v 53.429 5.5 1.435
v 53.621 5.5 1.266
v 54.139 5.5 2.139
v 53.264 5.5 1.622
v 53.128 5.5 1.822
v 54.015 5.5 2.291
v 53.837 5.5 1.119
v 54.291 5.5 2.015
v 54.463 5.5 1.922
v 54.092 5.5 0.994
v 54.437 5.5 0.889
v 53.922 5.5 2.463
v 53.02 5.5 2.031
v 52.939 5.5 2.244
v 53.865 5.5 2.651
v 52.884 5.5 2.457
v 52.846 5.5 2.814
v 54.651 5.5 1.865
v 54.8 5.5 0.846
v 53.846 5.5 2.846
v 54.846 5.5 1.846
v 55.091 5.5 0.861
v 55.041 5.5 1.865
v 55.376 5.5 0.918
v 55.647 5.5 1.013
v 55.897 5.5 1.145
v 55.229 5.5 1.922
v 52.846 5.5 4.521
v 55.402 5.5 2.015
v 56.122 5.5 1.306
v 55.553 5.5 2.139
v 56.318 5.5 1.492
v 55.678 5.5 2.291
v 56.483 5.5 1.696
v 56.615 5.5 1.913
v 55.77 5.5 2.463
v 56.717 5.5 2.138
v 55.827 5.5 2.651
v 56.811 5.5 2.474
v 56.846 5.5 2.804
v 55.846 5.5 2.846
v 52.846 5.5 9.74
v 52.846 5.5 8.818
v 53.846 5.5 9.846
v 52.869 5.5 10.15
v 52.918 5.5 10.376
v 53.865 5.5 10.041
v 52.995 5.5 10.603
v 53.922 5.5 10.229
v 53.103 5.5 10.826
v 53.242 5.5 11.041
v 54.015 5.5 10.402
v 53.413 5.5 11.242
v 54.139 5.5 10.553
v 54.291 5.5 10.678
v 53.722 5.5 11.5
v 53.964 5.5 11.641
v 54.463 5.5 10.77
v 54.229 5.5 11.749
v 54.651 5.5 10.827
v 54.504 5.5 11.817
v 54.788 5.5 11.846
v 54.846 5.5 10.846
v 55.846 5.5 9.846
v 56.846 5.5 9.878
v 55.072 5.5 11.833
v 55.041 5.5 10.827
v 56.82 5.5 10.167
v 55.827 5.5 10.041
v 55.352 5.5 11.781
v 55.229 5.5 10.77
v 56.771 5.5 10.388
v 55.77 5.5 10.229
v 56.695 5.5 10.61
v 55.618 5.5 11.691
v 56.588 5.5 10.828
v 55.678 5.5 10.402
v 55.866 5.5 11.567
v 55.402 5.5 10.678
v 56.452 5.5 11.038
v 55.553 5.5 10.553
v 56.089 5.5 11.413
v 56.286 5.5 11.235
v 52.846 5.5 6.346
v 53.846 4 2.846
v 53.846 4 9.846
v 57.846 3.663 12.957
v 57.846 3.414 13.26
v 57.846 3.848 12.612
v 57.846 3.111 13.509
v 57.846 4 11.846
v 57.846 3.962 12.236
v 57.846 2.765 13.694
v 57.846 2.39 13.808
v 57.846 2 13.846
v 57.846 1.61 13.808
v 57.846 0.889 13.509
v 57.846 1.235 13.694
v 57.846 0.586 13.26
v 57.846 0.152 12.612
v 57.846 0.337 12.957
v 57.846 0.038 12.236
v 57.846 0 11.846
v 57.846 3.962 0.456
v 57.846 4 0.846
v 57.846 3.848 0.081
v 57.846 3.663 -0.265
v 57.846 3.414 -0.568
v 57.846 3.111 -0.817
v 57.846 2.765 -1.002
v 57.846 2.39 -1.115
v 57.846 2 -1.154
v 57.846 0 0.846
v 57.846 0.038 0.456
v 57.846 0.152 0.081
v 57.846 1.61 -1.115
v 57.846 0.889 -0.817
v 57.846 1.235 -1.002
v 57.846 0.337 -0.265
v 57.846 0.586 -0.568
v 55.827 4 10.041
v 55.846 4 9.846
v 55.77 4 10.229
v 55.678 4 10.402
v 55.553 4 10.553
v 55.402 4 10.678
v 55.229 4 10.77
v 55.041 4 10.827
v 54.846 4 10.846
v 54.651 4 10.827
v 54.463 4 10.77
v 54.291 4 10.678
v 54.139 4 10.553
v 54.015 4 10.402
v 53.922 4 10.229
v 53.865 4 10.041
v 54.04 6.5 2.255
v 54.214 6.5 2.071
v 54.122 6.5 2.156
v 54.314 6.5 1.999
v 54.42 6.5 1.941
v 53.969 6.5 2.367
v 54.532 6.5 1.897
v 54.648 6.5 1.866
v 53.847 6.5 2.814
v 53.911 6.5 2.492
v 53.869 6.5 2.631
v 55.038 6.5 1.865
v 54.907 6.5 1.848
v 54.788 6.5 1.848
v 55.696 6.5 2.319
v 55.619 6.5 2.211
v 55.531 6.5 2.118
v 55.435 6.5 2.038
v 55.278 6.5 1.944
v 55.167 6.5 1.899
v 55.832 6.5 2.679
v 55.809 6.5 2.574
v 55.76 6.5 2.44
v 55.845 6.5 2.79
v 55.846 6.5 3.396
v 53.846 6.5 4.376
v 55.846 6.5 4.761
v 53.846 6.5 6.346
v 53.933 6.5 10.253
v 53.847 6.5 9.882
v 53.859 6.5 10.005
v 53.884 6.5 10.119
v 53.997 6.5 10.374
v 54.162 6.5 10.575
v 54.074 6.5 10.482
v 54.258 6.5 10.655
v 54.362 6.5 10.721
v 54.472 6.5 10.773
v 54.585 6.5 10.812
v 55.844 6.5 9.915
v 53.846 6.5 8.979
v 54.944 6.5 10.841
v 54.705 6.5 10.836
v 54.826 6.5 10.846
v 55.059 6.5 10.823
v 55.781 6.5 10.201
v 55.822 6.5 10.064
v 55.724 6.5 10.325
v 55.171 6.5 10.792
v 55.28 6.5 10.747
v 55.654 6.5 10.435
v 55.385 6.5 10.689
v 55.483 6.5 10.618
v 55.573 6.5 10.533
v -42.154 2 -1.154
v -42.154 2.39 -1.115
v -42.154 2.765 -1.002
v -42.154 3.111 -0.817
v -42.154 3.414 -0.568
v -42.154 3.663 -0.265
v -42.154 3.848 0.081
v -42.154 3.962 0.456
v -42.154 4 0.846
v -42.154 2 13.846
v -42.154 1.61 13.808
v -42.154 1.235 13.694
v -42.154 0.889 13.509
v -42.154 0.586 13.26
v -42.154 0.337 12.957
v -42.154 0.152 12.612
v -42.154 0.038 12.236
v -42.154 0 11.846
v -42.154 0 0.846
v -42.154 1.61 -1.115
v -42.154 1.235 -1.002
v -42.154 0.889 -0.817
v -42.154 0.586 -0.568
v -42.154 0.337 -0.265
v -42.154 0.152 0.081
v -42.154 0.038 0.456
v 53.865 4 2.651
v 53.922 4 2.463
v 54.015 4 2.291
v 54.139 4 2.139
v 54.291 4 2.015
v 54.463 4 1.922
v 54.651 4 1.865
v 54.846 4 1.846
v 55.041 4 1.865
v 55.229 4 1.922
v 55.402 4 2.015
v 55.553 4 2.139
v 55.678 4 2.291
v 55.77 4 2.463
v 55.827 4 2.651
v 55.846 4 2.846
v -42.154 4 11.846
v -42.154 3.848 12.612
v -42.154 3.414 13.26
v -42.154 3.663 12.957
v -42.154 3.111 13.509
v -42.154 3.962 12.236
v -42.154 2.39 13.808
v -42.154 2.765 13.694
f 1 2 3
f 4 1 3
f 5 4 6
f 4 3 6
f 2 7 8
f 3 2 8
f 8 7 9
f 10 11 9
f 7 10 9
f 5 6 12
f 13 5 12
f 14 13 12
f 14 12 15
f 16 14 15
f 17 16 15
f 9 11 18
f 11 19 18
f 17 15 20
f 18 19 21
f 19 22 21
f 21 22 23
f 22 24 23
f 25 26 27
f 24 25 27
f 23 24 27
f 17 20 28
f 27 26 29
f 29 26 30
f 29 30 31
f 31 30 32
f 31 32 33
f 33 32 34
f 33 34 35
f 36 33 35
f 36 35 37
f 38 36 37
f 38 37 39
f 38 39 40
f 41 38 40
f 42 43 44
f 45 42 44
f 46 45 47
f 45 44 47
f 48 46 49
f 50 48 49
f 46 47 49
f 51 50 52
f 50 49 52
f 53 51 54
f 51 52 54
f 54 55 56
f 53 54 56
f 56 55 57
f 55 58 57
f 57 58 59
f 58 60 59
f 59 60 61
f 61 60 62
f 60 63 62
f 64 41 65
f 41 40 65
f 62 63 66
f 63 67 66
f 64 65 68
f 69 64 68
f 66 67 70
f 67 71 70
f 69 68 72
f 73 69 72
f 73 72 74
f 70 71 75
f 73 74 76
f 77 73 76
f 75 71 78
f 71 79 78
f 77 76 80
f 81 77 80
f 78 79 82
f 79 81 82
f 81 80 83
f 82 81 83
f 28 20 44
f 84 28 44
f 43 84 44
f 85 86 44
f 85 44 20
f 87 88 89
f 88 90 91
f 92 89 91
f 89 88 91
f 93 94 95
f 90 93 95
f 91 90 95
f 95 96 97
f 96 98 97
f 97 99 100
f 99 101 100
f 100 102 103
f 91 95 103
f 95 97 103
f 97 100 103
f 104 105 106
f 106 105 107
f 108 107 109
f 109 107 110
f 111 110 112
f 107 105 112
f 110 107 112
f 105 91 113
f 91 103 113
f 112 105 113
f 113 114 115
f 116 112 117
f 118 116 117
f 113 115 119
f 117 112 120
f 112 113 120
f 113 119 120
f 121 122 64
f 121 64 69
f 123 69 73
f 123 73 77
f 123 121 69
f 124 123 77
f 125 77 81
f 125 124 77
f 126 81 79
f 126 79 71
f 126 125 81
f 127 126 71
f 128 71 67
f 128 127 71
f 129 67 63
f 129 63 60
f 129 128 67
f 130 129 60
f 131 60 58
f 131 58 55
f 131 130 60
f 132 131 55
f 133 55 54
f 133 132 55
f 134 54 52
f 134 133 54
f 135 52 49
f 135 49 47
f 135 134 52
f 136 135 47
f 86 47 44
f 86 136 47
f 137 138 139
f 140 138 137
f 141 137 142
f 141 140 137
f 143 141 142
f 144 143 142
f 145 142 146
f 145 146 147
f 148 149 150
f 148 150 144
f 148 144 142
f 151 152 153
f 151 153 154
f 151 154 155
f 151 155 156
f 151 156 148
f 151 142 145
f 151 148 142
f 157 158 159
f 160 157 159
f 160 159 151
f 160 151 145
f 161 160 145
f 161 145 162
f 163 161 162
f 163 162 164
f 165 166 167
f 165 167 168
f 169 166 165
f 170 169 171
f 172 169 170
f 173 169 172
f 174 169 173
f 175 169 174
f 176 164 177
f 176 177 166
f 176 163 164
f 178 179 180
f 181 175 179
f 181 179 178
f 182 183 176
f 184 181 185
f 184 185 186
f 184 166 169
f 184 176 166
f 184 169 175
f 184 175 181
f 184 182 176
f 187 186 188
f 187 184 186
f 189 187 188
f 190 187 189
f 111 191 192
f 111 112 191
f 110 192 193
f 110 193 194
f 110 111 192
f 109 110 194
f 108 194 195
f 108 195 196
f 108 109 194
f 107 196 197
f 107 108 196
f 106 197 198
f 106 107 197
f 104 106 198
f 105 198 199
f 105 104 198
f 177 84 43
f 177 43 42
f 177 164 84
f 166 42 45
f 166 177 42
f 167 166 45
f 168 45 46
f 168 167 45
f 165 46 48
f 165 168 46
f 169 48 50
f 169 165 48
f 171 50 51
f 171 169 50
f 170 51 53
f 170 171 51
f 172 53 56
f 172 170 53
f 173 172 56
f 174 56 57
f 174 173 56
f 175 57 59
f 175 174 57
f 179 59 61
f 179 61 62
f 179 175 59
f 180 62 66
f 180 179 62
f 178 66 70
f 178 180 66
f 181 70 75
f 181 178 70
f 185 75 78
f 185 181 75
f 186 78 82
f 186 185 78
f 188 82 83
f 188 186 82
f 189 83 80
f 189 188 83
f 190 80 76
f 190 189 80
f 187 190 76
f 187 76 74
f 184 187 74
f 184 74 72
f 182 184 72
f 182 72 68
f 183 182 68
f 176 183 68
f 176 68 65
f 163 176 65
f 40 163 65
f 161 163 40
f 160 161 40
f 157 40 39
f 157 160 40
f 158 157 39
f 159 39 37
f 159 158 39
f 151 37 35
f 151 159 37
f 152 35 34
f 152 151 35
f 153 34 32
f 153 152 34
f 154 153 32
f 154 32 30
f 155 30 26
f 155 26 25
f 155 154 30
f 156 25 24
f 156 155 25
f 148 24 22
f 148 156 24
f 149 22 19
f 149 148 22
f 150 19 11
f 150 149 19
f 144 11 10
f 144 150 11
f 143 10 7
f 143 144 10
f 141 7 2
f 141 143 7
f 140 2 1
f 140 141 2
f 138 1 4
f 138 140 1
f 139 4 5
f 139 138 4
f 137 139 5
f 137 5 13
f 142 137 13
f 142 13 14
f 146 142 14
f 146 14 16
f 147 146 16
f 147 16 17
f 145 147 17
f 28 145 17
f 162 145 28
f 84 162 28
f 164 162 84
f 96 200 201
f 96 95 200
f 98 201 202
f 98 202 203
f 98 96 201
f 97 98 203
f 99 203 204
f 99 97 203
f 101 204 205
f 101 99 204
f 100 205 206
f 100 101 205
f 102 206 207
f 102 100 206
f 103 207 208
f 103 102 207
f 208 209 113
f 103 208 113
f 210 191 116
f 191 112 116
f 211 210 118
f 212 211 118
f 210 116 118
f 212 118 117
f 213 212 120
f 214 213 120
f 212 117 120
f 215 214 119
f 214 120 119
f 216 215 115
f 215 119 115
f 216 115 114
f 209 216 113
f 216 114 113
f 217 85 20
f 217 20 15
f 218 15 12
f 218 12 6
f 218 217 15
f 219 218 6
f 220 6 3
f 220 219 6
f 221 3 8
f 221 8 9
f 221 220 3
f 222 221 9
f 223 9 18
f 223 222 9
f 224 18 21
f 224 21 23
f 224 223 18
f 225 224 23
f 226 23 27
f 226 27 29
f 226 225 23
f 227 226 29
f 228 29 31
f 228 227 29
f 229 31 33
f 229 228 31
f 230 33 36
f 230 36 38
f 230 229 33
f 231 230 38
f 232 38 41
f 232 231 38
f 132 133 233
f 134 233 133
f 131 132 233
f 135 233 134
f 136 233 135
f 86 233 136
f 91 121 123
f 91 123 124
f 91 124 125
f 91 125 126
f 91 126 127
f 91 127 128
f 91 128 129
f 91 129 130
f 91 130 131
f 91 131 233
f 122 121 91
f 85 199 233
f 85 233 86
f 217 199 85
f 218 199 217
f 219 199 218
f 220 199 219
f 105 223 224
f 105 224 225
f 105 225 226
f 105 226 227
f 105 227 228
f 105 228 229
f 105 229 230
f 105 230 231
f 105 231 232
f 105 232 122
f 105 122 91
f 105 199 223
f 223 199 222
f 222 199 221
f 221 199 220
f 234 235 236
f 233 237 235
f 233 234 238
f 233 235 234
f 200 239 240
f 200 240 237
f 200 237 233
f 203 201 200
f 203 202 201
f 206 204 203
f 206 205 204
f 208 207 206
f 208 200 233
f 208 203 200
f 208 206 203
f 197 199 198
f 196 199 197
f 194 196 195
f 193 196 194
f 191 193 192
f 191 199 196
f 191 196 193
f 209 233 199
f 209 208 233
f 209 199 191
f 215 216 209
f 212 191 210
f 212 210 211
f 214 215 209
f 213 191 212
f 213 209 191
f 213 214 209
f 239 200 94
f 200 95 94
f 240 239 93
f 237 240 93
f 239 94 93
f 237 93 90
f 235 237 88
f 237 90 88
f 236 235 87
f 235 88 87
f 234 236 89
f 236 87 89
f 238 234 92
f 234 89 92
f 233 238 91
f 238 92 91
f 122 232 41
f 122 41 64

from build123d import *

# Parameters (mm, degrees)
SKETCH2_W           = 100
SKETCH2_H           = 15
BOSS_EXTRUDE1_DEPTH = 4
FILLET4_R           = 2
BOSS_EXTRUDE4_DEPTH = 1.5


with BuildPart() as part:
    # Sketch2 → Boss-Extrude1 (new body)
    with BuildSketch(Plane(origin=(0, 0, 0), x_dir=(1, 0, 0), z_dir=(0, 1, 0))):
        with Locations((7.846153846, -6.346153846)):
            Rectangle(SKETCH2_W, SKETCH2_H)
    extrude(amount=BOSS_EXTRUDE1_DEPTH)

    # Fillet4
    fillet4_edges = [part.edges().sort_by_distance(p)[0] for p in [
        (7.846153846, 4, -1.153846154),
        (7.846153846, 0, -1.153846154),
        (7.846153846, 4, 13.846153846),
        (7.846153846, 0, 13.846153846),
    ]]
    fillet(fillet4_edges, radius=FILLET4_R - 0.0001)  # a hair under: the kernel refuses the full size

    # Sketch10 → Boss-Extrude4 (add)
    with BuildSketch(Plane(origin=(0, 4, 0), x_dir=(1, 0, 0), z_dir=(0, 1, 0))):
        with BuildLine():
            Line((53.846153846, -9.846153846), (53.846153846, -2.846153846))
            ThreePointArc((53.846153846, -2.846153846), (54.846153846, -1.846153846), (55.846153846, -2.846153846))
            Line((55.846153846, -2.846153846), (55.846153846, -9.846153846))
            ThreePointArc((55.846153846, -9.846153846), (54.846153846, -10.846153846), (53.846153846, -9.846153846))
        make_face()
    extrude(amount=BOSS_EXTRUDE4_DEPTH)

    # Loft6: read off the stored shape, not the designer's step
    # Loft6: loft between two sections, ruled curve by curve
    loft6_from = [
        Edge.make_bspline([(52.846153846, 5.5, 6.346153846), (52.846153846, 5.5, 6.893229755), (52.846153846, 5.5, 7.987381572), (52.846153846, 5.5, 9.172470024), (52.846153846, 5.5, 10.062777988), (52.916794739, 5.5, 10.520533365), (53.297264612, 5.5, 11.19493708), (53.970100399, 5.5, 11.713677023), (54.846153846, 5.5, 11.912823977), (55.722207294, 5.5, 11.713677023), (56.395043081, 5.5, 11.19493708), (56.775512954, 5.5, 10.520533365), (56.846153846, 5.5, 10.062777988), (56.846153846, 5.5, 9.172470024), (56.846153846, 5.5, 7.987381572), (56.846153846, 5.5, 6.346153846), (56.846153846, 5.5, 4.70492612), (56.846153846, 5.5, 3.519837669), (56.846153846, 5.5, 2.629529705), (56.775512954, 5.5, 2.171774328), (56.395043081, 5.5, 1.497370612), (55.722207294, 5.5, 0.97863067), (54.846153846, 5.5, 0.779483716), (53.970100399, 5.5, 0.97863067), (53.297264612, 5.5, 1.497370612), (52.916794739, 5.5, 2.171774328), (52.846153846, 5.5, 2.629529705), (52.846153846, 5.5, 3.519837669), (52.846153846, 5.5, 4.70492612), (52.846153846, 5.5, 5.799077937), (52.846153846, 5.5, 6.346153846)], [0.347848884, 0.347848884, 0.347848884, 0.347848884, 0.423924442, 0.5, 0.5, 0.524462221, 0.548924442, 0.573386663, 0.597848884, 0.622311105, 0.646773326, 0.671235547, 0.695697768, 0.695697768, 0.771773326, 0.847848884, 0.923924442, 1, 1, 1.024462221, 1.048924442, 1.073386663, 1.097848884, 1.122311105, 1.146773326, 1.171235547, 1.195697768, 1.195697768, 1.271773326, 1.347848884, 1.347848884, 1.347848884, 1.347848884], 3),
    ]
    loft6_to = [
        Edge.make_bspline([(53.846153846, 6.5, 6.346153846), (53.846153846, 6.5, 6.970863619), (53.846153846, 6.5, 8.220283163), (53.846153846, 6.5, 9.3318023), (53.846153846, 6.5, 10.011544432), (53.92463889, 6.5, 10.301418233), (54.169662015, 6.5, 10.614768288), (54.490600847, 6.5, 10.803946654), (54.846153846, 6.5, 10.867265337), (55.201706845, 6.5, 10.803946654), (55.522645677, 6.5, 10.614768288), (55.767668802, 6.5, 10.301418233), (55.846153846, 6.5, 10.011544432), (55.846153846, 6.5, 9.3318023), (55.846153846, 6.5, 8.220283163), (55.846153846, 6.5, 6.346153846), (55.846153846, 6.5, 4.472024529), (55.846153846, 6.5, 3.360505393), (55.846153846, 6.5, 2.68076326), (55.767668802, 6.5, 2.390889459), (55.522645677, 6.5, 2.077539404), (55.201706845, 6.5, 1.888361038), (54.846153846, 6.5, 1.825042355), (54.490600847, 6.5, 1.888361038), (54.169662015, 6.5, 2.077539404), (53.92463889, 6.5, 2.390889459), (53.846153846, 6.5, 2.68076326), (53.846153846, 6.5, 3.360505393), (53.846153846, 6.5, 4.472024529), (53.846153846, 6.5, 5.721444074), (53.846153846, 6.5, 6.346153846)], [0.347848884, 0.347848884, 0.347848884, 0.347848884, 0.423924442, 0.5, 0.5, 0.524462221, 0.548924442, 0.573386663, 0.597848884, 0.622311105, 0.646773326, 0.671235547, 0.695697768, 0.695697768, 0.771773326, 0.847848884, 0.923924442, 1, 1, 1.024462221, 1.048924442, 1.073386663, 1.097848884, 1.122311105, 1.146773326, 1.171235547, 1.195697768, 1.195697768, 1.271773326, 1.347848884, 1.347848884, 1.347848884, 1.347848884], 3),
    ]
    loft6 = Solid(Shell([*[Face.make_surface_from_curves(loft6_from[k], loft6_to[k]) for k in range(1)], Face(Wire(loft6_from)), Face(Wire(loft6_to))]))
    add(loft6)


solid = part.part
